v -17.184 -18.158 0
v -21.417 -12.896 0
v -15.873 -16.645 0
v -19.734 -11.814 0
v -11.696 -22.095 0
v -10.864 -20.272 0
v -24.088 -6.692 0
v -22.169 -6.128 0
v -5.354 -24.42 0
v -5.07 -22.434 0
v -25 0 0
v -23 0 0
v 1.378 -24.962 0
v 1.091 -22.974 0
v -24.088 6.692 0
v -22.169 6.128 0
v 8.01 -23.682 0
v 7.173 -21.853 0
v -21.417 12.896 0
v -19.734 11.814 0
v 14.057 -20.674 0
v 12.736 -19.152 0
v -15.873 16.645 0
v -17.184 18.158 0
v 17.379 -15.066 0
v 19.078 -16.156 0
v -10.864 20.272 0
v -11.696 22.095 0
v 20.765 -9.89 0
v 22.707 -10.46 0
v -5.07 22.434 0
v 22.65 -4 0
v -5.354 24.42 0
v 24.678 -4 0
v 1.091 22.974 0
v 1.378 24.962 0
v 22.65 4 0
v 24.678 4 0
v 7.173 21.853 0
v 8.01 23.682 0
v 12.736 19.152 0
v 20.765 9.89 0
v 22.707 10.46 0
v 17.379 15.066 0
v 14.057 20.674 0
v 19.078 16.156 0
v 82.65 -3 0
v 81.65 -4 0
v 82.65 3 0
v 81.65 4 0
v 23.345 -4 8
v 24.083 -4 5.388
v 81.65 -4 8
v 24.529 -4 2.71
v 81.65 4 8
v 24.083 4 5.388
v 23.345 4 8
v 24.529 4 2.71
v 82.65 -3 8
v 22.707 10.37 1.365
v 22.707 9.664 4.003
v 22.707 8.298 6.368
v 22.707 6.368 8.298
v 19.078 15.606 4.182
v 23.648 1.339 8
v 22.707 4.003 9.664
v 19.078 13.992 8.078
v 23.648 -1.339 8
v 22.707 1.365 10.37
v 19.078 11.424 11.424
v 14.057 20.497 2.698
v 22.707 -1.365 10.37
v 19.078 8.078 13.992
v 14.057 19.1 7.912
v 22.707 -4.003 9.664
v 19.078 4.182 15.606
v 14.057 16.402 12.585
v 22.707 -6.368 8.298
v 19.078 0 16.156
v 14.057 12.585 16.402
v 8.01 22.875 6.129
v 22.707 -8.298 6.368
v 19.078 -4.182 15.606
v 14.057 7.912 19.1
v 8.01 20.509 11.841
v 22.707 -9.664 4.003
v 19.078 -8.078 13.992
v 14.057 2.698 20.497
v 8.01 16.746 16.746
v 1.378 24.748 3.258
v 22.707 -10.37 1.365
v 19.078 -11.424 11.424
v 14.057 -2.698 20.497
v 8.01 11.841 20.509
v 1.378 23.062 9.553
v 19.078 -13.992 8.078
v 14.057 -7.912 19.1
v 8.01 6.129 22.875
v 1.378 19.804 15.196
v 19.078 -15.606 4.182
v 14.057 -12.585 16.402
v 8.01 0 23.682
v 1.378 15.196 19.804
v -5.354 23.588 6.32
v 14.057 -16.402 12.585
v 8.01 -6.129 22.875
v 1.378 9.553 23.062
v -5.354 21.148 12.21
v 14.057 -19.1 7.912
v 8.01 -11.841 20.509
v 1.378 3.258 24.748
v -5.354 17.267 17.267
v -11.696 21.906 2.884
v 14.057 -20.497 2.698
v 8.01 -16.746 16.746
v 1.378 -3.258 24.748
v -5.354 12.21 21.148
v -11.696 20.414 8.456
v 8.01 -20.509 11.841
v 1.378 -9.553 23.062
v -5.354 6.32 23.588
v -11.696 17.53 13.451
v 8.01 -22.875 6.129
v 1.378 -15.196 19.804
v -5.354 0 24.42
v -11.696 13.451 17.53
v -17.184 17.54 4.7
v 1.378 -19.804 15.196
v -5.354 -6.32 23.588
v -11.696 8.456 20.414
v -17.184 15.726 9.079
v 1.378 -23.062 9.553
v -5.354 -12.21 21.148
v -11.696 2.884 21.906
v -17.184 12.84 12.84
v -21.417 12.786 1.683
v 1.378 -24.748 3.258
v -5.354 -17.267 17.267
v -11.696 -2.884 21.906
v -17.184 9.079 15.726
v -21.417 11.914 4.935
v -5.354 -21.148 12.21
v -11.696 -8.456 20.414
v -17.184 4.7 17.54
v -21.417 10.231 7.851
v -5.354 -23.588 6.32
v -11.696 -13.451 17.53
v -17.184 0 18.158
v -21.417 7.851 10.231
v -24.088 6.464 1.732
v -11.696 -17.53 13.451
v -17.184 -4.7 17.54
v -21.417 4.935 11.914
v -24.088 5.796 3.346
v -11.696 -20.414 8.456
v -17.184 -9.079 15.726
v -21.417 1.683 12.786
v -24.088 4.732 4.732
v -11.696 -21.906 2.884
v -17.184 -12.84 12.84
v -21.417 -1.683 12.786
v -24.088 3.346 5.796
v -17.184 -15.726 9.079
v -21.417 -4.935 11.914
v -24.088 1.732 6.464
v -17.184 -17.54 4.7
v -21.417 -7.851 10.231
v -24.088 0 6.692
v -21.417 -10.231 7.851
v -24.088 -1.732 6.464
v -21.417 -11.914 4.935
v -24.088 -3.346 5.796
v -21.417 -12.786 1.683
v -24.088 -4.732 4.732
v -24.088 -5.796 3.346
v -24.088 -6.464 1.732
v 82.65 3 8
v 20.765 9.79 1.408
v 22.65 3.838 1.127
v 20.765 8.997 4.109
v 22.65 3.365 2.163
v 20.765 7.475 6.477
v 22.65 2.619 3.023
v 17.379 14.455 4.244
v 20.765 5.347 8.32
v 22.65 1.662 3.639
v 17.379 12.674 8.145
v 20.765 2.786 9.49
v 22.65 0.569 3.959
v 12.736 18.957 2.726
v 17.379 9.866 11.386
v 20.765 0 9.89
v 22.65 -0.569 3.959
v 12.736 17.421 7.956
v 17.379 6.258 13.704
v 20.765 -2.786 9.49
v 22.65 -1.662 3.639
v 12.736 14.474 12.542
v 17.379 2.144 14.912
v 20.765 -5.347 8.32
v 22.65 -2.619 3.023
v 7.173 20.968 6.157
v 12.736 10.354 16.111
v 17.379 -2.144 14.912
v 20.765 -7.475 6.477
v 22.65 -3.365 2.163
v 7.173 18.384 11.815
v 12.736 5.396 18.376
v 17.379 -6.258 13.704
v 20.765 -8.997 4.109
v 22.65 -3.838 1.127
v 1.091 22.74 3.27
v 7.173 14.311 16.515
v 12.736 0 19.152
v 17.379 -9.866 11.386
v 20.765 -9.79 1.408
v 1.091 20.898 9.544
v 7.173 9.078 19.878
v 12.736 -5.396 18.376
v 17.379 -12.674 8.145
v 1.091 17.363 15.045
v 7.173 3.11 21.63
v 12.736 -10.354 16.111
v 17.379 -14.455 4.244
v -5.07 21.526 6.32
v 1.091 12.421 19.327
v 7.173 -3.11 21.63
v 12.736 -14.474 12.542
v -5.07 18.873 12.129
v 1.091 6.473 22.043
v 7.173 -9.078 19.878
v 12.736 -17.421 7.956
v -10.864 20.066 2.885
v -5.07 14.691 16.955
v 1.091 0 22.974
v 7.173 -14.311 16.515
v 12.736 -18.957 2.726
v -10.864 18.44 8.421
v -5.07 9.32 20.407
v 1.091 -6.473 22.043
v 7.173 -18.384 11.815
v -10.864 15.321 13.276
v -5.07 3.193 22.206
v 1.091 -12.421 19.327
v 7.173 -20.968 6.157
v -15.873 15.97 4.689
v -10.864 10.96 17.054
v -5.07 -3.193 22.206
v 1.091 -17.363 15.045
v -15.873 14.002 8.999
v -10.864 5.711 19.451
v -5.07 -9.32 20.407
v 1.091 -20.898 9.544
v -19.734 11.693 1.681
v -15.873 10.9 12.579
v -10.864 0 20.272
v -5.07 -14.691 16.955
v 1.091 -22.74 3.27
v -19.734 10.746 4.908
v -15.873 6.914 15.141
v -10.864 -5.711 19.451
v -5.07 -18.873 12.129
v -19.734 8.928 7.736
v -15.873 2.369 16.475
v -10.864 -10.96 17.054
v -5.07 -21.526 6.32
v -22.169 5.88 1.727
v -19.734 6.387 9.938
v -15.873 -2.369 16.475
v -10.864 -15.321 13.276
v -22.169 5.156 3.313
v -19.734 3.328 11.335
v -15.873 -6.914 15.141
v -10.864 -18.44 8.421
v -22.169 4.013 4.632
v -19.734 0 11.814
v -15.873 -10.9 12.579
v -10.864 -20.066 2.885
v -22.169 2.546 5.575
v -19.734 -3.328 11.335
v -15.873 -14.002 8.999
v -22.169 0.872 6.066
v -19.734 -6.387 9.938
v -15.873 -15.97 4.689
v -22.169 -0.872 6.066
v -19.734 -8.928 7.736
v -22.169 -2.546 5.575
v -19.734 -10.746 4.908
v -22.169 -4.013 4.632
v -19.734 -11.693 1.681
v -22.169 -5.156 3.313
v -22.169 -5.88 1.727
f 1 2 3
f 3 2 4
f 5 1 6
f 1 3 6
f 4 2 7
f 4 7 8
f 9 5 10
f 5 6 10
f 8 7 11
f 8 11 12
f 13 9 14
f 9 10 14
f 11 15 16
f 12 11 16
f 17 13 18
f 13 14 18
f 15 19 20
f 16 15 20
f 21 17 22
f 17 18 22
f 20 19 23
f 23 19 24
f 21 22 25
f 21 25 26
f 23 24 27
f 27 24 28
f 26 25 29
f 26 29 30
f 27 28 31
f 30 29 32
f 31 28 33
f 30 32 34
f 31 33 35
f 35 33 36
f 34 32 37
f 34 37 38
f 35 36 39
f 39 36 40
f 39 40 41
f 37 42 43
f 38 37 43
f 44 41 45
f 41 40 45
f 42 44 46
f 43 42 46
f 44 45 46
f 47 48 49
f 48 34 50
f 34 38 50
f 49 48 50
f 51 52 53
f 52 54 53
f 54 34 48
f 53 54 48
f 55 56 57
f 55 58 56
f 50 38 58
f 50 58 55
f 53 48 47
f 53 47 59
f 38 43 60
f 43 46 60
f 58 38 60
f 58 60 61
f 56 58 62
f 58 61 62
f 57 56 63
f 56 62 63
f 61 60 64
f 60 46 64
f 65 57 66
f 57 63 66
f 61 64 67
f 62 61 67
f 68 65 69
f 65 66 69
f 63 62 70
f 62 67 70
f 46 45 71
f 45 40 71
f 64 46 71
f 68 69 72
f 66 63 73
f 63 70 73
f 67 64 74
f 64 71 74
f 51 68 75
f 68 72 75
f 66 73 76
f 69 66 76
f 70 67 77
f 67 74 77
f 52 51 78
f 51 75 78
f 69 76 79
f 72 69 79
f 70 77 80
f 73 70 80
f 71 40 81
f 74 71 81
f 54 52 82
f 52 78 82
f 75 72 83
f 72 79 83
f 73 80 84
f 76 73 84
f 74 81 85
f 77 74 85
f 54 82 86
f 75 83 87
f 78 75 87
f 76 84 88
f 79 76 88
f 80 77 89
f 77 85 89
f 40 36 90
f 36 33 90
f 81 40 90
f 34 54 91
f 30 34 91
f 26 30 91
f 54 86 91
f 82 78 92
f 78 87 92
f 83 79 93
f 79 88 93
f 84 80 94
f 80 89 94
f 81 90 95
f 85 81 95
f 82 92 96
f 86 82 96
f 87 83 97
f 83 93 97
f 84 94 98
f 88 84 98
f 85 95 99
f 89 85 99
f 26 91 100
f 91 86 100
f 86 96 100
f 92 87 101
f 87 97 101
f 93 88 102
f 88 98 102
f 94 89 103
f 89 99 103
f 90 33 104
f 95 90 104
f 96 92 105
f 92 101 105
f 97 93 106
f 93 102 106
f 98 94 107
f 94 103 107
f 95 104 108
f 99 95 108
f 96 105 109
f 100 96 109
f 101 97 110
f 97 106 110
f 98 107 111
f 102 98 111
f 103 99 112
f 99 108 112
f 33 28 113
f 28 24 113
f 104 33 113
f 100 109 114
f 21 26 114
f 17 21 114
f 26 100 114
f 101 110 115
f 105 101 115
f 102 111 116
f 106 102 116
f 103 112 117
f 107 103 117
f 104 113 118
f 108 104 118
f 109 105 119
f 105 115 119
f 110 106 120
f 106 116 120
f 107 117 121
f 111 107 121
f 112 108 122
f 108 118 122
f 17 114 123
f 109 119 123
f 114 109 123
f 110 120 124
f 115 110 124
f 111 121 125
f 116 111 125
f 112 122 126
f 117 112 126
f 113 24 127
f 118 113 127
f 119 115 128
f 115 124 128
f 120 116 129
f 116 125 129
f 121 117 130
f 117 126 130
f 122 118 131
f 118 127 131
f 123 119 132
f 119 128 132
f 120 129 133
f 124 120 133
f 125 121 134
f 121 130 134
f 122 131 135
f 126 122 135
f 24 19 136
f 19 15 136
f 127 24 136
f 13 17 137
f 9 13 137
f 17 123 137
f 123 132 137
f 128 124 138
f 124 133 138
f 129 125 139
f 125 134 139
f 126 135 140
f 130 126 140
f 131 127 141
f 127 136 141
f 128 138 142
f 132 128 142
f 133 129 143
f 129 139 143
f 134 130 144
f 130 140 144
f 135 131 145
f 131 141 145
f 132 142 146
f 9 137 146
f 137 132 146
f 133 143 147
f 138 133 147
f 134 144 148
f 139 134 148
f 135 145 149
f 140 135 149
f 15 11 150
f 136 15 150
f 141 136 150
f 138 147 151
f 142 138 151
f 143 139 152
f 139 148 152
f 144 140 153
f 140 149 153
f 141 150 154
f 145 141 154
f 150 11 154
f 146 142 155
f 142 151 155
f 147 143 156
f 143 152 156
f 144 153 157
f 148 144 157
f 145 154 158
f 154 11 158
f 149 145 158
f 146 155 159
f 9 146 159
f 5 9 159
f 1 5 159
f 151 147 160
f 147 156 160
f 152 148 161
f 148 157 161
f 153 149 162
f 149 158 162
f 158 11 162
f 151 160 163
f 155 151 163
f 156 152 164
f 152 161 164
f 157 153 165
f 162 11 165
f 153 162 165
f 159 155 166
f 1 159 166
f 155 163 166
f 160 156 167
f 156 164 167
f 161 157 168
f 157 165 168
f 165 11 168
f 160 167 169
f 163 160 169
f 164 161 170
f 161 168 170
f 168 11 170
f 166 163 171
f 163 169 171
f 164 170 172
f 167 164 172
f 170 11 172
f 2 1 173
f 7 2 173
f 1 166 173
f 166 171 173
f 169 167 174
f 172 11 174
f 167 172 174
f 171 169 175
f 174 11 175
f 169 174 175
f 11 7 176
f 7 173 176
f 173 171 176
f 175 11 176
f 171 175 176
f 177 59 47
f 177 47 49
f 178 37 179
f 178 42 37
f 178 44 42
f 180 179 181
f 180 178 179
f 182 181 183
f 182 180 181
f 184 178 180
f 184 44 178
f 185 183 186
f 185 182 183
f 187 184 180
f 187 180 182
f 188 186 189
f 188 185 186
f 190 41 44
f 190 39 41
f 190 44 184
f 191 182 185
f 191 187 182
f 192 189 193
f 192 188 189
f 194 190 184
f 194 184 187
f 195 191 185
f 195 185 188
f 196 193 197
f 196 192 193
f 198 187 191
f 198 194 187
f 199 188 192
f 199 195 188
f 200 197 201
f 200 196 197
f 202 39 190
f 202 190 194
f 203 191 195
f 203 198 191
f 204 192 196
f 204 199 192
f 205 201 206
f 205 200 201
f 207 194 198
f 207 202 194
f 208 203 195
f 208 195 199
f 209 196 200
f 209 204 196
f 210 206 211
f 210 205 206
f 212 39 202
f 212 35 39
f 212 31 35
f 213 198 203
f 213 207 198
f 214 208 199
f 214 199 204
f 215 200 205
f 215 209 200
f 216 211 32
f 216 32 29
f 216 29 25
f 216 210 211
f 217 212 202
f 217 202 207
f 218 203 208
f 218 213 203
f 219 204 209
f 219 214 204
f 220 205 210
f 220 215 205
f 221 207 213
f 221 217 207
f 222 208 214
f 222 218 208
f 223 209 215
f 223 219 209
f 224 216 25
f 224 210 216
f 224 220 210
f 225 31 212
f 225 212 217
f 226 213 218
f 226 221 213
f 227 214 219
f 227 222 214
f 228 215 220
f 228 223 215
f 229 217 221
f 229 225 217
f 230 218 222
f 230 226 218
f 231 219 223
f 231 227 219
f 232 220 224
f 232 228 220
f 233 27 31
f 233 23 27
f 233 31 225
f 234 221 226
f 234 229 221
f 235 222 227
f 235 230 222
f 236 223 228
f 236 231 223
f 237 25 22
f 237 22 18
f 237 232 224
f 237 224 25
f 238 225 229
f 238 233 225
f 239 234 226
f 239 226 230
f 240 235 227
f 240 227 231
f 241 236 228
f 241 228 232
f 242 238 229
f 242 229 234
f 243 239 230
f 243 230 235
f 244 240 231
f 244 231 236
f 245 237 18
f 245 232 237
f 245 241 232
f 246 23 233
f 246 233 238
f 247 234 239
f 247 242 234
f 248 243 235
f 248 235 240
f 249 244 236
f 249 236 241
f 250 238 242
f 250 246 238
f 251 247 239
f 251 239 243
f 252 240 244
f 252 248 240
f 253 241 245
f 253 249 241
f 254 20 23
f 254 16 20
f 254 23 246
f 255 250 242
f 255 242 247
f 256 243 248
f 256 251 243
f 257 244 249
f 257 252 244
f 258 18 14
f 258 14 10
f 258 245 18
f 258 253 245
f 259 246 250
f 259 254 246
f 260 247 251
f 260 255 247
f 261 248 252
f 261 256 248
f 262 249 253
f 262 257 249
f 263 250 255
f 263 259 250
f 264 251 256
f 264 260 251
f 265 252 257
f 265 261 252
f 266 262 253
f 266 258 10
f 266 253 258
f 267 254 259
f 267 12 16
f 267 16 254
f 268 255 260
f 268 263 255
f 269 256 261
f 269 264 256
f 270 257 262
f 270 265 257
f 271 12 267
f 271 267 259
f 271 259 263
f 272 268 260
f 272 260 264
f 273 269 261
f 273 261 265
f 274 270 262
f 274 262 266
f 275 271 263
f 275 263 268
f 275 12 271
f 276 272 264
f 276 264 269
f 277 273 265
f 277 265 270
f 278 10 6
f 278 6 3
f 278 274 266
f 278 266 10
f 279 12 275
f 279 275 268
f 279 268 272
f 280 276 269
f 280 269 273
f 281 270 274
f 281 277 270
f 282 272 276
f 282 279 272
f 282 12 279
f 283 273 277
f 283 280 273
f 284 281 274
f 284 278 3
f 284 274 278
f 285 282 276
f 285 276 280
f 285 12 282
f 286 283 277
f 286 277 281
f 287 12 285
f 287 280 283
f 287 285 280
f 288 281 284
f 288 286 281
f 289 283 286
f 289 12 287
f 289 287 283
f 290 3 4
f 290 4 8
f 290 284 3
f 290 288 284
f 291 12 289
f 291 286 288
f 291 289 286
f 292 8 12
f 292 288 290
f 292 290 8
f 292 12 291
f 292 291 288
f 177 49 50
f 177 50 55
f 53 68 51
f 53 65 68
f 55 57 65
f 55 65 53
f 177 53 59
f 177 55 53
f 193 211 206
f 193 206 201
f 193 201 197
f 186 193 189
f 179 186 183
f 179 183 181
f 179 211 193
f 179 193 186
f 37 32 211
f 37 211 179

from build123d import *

# Parameters (mm, degrees)
R_VOLUTION1_ANGLE  = 180
COQUE1_T           = -2
ESQUISSE2_W        = 60
ESQUISSE2_H        = 8
BOSS_EXTRU_1_DEPTH = 8
CHANFREIN1_SIZE    = 1


with BuildPart() as part:
    # Esquisse1 → Révolution1 (revolve)
    with BuildSketch(Plane.XY):
        with BuildLine():
            Line((-25, 0), (25, 0))
            ThreePointArc((25, 0), (0, 25), (-25, 0))
        make_face()
    revolve(axis=Axis((-25, 0, 0), (1, 0, 0)), revolution_arc=R_VOLUTION1_ANGLE)

    # Coque1
    coque1_openings = [part.faces().sort_by_distance(p)[0] for p in [
        (-25, 0, 0),
    ]]
    offset(amount=COQUE1_T, openings=coque1_openings)

    # Esquisse2 → Boss.-Extru.1 (add)
    with BuildSketch(Plane.XY):
        with Locations((52.649503306, 0)):
            Rectangle(ESQUISSE2_W, ESQUISSE2_H)
    extrude(amount=BOSS_EXTRU_1_DEPTH)

    # Chanfrein1
    chanfrein1_edges = [part.edges().sort_by_distance(p)[0] for p in [
        (82.649503306, -4, 4),
        (82.649503306, 4, 4),
    ]]
    chamfer(chanfrein1_edges, length=CHANFREIN1_SIZE)


solid = part.part
